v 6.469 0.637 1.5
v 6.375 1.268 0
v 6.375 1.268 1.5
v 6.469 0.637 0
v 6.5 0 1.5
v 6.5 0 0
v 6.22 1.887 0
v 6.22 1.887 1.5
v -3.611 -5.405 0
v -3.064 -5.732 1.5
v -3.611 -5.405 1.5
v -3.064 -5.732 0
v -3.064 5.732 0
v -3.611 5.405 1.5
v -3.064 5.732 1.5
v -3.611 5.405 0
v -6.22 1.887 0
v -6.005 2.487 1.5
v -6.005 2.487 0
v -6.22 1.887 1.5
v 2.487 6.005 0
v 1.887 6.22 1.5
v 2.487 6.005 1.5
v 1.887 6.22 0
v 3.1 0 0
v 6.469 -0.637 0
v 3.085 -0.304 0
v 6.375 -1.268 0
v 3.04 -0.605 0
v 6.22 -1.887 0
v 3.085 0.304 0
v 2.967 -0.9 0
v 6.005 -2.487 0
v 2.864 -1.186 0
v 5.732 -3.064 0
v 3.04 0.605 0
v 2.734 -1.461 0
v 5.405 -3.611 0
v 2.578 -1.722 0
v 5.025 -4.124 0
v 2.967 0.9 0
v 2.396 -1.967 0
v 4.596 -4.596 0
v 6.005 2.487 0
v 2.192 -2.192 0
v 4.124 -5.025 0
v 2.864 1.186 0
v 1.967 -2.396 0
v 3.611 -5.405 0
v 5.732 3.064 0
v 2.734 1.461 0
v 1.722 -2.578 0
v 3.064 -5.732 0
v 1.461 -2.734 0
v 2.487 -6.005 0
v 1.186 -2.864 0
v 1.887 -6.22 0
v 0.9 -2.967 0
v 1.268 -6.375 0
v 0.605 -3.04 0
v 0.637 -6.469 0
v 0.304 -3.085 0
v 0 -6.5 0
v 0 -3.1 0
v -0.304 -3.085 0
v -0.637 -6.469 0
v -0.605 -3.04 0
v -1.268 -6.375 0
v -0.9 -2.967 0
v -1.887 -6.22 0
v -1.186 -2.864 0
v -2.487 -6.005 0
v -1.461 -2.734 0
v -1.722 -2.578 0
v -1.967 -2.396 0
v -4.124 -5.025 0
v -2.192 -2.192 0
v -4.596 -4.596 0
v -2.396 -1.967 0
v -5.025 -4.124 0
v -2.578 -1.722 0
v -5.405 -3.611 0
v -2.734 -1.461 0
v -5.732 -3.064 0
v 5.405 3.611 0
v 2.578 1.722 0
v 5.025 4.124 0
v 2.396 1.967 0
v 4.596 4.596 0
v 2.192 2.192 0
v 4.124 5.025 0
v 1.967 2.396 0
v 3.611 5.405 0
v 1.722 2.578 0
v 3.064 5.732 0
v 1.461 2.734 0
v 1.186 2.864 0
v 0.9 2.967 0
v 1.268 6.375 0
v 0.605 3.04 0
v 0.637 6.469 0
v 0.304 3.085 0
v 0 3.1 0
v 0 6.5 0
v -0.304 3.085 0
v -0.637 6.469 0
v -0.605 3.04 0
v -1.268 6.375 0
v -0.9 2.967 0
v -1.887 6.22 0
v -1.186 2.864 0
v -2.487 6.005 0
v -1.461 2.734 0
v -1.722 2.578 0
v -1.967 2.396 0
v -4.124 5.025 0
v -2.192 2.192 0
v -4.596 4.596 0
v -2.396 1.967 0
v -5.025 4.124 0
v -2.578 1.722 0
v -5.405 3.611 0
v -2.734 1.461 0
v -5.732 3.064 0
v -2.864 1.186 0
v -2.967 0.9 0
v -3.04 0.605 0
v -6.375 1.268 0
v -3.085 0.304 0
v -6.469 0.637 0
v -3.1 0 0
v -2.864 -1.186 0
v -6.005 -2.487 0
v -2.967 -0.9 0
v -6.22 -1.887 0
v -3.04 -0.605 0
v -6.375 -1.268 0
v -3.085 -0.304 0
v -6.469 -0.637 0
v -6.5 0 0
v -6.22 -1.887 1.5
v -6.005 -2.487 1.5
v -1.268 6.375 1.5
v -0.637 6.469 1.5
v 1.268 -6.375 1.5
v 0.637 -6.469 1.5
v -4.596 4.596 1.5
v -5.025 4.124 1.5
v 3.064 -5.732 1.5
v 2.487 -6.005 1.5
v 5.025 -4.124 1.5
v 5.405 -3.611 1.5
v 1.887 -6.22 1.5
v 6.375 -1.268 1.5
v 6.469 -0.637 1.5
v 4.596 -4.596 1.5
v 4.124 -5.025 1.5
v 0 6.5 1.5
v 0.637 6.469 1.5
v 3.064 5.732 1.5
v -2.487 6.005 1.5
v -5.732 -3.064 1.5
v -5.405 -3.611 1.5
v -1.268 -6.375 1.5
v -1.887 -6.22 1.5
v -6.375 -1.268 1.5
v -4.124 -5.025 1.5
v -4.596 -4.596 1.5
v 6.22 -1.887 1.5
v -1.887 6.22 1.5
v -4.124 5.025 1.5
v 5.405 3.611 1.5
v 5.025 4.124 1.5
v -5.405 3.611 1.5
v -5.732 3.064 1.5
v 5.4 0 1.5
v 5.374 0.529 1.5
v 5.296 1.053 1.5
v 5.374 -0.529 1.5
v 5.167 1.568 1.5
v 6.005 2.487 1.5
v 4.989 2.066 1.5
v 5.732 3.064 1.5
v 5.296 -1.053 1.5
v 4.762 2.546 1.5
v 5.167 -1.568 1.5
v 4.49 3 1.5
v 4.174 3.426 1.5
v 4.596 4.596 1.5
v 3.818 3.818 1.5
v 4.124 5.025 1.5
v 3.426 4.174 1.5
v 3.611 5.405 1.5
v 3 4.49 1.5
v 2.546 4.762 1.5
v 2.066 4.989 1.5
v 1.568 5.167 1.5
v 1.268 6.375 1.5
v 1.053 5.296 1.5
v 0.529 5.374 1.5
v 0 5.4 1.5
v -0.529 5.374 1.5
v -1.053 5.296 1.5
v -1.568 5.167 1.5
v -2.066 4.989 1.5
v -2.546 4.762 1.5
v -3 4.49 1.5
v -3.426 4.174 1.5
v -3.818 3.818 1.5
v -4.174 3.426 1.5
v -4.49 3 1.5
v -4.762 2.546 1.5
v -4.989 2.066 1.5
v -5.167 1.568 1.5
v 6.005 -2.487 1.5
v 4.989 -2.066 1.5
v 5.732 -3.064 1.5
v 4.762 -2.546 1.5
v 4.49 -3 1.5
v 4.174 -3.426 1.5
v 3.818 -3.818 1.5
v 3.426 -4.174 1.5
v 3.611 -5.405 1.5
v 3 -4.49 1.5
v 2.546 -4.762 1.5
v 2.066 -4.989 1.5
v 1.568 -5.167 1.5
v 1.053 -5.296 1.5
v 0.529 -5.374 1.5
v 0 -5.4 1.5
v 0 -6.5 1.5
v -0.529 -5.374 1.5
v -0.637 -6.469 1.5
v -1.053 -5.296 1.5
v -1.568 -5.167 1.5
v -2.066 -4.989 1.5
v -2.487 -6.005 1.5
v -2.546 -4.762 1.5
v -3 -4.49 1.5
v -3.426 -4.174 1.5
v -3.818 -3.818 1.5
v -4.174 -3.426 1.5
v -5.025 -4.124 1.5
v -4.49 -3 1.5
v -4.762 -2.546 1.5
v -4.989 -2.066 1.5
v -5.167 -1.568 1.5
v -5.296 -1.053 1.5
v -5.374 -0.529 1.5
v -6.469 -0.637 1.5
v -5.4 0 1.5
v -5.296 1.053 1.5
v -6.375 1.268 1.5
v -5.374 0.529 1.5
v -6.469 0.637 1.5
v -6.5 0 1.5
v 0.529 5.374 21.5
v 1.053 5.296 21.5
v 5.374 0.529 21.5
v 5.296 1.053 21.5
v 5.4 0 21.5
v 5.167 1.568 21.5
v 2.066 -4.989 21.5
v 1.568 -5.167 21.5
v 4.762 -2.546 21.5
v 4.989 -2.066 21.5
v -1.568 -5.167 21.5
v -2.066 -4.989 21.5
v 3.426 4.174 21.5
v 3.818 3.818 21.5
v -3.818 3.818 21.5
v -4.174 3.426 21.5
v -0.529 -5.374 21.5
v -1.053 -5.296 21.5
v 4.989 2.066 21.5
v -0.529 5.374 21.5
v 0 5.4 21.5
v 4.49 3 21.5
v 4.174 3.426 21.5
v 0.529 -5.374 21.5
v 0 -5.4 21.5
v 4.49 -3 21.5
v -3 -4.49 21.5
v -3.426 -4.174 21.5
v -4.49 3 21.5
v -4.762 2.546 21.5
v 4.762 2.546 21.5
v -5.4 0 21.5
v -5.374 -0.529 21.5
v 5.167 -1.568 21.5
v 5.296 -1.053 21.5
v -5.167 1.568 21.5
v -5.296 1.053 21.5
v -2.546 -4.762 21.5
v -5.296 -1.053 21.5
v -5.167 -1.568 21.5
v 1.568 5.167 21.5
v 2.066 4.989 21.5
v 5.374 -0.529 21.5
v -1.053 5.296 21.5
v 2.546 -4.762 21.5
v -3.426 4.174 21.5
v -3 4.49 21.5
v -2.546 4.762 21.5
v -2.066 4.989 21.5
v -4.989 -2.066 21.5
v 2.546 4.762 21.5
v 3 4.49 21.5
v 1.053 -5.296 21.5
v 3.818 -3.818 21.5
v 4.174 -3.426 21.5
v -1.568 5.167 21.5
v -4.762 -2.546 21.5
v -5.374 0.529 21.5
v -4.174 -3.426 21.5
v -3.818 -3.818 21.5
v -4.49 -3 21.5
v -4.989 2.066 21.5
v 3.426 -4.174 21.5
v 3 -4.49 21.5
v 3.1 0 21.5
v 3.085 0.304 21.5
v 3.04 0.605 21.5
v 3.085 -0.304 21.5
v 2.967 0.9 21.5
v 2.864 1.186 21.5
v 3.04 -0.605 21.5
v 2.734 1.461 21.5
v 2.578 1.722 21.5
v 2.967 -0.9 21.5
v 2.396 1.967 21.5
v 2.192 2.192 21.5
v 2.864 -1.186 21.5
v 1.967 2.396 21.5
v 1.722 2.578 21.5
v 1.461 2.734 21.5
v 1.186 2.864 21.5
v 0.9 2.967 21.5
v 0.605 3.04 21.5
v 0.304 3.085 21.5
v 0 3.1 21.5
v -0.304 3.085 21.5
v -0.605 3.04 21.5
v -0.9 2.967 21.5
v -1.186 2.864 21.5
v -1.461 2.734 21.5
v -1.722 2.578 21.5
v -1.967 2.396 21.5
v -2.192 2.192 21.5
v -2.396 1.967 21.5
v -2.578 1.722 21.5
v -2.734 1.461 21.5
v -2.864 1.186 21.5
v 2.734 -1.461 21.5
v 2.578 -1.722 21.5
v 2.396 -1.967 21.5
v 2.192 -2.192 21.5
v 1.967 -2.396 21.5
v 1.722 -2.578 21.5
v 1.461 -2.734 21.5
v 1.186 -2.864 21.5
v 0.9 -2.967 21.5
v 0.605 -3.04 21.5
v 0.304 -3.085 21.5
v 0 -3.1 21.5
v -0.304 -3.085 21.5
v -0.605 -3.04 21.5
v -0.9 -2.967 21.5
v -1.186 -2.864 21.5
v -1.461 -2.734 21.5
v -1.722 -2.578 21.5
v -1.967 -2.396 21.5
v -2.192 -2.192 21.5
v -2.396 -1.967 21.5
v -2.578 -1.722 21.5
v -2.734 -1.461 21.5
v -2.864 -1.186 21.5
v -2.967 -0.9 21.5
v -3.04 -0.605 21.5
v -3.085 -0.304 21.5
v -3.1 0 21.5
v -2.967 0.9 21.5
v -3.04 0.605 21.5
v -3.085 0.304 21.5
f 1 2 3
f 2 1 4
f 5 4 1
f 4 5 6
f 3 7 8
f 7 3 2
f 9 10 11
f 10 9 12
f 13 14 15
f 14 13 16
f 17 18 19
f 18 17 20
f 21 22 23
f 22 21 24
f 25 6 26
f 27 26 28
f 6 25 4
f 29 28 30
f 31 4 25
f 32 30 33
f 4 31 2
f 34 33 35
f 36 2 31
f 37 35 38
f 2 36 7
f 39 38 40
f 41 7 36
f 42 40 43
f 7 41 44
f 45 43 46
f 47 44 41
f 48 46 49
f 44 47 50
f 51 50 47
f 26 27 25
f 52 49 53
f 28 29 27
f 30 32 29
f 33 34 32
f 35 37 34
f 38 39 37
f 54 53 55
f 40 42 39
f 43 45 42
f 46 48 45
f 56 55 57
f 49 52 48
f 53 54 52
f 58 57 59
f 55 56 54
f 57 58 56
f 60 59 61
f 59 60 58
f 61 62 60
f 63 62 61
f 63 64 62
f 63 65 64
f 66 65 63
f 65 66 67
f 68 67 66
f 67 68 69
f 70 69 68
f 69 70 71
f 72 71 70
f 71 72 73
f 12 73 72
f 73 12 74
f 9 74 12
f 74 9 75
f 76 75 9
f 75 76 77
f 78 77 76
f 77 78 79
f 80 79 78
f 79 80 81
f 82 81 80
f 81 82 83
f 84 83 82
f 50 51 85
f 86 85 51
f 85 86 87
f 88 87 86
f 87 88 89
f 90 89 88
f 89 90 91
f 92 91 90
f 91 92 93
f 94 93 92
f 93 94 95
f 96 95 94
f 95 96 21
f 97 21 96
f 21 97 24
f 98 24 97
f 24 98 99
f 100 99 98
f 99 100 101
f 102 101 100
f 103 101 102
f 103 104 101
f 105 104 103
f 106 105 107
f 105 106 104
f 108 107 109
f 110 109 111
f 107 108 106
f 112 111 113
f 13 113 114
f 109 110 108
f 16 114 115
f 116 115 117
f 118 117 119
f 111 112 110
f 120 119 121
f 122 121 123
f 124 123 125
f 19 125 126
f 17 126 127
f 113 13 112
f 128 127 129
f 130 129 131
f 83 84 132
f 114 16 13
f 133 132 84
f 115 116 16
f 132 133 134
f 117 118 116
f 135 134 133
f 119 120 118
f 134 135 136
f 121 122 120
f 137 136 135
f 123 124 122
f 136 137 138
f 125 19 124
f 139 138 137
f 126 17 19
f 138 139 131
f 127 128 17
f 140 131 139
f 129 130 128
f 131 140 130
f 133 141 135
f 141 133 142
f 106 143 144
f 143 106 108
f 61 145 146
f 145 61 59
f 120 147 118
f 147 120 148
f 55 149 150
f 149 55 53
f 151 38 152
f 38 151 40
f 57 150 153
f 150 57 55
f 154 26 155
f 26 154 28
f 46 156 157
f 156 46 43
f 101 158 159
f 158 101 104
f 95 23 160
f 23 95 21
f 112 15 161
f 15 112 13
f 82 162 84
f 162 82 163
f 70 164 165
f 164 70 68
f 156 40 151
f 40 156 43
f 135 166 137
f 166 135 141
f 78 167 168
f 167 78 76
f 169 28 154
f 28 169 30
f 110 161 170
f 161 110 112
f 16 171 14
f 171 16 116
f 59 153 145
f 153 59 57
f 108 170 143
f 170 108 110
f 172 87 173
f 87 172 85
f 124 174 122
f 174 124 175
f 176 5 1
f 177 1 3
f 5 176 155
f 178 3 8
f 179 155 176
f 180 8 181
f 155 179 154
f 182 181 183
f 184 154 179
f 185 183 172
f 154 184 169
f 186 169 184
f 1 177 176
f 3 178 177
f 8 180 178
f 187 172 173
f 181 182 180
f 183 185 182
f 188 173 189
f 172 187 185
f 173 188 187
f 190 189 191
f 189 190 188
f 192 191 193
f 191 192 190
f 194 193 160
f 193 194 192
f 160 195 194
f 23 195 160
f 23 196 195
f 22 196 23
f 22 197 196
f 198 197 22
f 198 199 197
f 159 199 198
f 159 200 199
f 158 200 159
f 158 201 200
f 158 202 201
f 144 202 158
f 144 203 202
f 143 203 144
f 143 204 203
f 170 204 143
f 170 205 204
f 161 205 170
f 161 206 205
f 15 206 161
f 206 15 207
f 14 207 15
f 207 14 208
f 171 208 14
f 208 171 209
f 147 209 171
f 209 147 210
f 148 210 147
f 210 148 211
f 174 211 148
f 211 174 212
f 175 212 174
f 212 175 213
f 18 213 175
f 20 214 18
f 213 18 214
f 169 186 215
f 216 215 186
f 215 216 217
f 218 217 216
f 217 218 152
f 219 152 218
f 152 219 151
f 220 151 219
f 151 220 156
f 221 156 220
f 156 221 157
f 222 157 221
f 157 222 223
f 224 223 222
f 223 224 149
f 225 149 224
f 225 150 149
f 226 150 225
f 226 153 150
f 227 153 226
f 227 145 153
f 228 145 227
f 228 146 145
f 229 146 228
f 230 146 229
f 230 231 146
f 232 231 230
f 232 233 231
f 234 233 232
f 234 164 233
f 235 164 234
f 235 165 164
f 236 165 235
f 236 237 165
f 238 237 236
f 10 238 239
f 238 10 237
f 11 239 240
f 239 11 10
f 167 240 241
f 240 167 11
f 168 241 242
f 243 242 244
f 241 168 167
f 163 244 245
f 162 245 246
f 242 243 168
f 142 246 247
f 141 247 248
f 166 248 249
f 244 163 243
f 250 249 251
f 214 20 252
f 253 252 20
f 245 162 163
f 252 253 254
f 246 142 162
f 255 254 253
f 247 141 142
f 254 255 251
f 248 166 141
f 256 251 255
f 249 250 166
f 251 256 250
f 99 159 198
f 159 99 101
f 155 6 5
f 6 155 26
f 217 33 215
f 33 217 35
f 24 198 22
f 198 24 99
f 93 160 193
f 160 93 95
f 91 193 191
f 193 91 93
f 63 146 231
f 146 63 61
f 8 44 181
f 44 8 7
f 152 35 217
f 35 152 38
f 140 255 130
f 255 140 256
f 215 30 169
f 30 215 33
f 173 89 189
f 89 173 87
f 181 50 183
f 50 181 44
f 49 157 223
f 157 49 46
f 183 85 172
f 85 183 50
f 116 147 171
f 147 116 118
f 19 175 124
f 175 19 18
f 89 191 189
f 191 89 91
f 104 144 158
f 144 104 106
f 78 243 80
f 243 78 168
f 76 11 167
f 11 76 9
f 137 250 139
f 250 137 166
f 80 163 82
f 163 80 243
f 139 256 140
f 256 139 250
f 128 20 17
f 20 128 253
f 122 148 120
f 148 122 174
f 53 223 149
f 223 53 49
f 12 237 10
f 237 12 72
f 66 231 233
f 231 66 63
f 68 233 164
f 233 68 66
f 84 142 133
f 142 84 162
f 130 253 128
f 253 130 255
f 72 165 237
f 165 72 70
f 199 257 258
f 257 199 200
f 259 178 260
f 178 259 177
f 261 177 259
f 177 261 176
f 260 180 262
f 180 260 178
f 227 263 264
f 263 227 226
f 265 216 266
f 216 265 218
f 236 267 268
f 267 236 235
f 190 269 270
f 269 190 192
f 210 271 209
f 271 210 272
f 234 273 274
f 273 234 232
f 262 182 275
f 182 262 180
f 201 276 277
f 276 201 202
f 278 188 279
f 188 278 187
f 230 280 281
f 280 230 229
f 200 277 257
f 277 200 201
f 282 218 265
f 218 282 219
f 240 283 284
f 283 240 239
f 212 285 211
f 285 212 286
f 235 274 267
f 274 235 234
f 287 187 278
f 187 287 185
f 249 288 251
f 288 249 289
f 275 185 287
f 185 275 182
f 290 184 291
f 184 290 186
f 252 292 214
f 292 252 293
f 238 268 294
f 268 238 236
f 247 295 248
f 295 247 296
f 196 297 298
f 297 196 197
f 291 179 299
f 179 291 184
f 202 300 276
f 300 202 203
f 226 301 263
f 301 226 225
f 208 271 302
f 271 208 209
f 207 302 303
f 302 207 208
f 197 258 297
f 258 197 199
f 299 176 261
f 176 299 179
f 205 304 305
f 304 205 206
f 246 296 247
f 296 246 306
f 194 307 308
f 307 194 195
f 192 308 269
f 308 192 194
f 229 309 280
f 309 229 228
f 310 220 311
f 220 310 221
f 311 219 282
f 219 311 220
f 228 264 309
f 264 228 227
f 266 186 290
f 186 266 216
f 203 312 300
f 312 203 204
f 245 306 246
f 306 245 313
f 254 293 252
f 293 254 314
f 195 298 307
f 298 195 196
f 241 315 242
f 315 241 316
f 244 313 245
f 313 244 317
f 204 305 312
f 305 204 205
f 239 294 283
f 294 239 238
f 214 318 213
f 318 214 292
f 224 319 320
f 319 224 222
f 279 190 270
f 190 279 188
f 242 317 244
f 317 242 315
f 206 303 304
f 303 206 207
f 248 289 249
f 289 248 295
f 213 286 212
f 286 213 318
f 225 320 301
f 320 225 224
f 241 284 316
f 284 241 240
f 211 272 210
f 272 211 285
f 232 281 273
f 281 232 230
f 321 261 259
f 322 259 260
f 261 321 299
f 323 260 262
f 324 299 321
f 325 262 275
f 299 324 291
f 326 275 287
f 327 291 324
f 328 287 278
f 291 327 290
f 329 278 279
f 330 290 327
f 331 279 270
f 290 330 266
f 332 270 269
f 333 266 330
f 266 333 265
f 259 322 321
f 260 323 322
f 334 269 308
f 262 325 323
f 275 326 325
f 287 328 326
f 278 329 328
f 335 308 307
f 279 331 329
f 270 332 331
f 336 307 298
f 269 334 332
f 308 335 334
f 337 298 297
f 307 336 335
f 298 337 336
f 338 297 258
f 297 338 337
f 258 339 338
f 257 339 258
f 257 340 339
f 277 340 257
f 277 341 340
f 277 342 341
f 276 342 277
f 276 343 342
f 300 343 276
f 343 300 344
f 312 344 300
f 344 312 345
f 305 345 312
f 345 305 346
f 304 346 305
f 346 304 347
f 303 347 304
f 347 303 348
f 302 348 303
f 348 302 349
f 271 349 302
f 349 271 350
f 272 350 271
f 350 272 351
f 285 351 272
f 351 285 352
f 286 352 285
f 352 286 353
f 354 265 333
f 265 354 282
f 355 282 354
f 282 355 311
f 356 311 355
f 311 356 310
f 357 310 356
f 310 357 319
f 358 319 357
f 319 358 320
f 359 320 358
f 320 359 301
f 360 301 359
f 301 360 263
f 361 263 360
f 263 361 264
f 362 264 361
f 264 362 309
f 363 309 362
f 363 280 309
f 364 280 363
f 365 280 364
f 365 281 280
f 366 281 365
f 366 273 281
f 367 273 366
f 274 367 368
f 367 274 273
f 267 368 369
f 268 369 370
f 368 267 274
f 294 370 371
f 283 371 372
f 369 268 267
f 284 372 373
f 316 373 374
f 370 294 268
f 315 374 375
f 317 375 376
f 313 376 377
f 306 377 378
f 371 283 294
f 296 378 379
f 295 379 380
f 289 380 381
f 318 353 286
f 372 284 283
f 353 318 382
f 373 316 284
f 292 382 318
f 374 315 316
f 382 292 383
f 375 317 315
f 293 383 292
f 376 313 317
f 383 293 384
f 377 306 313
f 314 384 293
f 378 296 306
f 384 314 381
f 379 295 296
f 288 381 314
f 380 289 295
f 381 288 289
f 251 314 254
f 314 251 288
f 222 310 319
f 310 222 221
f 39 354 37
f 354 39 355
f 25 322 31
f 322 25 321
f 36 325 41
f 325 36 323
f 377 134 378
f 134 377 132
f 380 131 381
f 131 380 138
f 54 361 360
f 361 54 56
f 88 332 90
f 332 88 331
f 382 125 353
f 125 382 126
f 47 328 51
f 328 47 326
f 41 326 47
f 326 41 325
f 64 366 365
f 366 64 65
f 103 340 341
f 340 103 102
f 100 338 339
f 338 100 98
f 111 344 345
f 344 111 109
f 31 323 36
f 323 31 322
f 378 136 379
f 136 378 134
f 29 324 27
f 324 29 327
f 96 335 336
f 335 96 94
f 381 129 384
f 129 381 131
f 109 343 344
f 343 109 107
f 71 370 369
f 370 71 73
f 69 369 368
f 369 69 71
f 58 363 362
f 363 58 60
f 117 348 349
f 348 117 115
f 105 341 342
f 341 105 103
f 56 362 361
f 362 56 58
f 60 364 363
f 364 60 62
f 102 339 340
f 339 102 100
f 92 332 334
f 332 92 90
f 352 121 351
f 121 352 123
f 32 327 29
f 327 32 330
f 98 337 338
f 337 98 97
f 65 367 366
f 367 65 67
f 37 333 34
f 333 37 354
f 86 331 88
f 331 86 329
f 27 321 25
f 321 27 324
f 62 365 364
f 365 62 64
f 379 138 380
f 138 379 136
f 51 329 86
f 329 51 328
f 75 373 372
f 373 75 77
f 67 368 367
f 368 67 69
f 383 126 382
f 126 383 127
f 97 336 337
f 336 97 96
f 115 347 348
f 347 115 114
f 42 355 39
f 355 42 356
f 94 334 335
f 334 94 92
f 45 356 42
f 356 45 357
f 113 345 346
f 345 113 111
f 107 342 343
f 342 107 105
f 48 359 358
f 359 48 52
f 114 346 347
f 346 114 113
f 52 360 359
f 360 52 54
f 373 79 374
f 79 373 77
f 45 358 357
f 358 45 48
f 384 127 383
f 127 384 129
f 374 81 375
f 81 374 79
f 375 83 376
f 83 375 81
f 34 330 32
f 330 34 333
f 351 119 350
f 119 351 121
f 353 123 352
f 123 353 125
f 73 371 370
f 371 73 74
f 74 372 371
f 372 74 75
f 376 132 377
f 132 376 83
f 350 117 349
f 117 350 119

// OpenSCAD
// Adapter sleeve: 0.2 mL PCR tube to 1.5 mL rack hole
// Dimensions measured with calipers

// Collar (rests on build plate)
collar_diameter = 13;
collar_thickness = 1.5;

// Sleeve body
sleeve_outer_diameter = 10.8;
sleeve_height = 21.5; // total height from z=0 to z=21.5

// Bore (through hole)
bore_diameter = 6.2;

// Print orientation: collar on bed (z=0 to 1.5), sleeve rises to z=21.5
// Centred on origin in X and Y

$fn = 64;

difference() {
    union() {
        // Collar
        translate([0, 0, 0])
            cylinder(h = collar_thickness, r = collar_diameter / 2, center = false);

        // Sleeve body
        translate([0, 0, collar_thickness])
            cylinder(h = sleeve_height - collar_thickness, r = sleeve_outer_diameter / 2, center = false);
    }

    // Bore: extends 1 mm below z=0 and 1 mm above z=21.5 to ensure clean cut
    translate([0, 0, -1])
        cylinder(h = sleeve_height + 2, r = bore_diameter / 2, center = false);
}
